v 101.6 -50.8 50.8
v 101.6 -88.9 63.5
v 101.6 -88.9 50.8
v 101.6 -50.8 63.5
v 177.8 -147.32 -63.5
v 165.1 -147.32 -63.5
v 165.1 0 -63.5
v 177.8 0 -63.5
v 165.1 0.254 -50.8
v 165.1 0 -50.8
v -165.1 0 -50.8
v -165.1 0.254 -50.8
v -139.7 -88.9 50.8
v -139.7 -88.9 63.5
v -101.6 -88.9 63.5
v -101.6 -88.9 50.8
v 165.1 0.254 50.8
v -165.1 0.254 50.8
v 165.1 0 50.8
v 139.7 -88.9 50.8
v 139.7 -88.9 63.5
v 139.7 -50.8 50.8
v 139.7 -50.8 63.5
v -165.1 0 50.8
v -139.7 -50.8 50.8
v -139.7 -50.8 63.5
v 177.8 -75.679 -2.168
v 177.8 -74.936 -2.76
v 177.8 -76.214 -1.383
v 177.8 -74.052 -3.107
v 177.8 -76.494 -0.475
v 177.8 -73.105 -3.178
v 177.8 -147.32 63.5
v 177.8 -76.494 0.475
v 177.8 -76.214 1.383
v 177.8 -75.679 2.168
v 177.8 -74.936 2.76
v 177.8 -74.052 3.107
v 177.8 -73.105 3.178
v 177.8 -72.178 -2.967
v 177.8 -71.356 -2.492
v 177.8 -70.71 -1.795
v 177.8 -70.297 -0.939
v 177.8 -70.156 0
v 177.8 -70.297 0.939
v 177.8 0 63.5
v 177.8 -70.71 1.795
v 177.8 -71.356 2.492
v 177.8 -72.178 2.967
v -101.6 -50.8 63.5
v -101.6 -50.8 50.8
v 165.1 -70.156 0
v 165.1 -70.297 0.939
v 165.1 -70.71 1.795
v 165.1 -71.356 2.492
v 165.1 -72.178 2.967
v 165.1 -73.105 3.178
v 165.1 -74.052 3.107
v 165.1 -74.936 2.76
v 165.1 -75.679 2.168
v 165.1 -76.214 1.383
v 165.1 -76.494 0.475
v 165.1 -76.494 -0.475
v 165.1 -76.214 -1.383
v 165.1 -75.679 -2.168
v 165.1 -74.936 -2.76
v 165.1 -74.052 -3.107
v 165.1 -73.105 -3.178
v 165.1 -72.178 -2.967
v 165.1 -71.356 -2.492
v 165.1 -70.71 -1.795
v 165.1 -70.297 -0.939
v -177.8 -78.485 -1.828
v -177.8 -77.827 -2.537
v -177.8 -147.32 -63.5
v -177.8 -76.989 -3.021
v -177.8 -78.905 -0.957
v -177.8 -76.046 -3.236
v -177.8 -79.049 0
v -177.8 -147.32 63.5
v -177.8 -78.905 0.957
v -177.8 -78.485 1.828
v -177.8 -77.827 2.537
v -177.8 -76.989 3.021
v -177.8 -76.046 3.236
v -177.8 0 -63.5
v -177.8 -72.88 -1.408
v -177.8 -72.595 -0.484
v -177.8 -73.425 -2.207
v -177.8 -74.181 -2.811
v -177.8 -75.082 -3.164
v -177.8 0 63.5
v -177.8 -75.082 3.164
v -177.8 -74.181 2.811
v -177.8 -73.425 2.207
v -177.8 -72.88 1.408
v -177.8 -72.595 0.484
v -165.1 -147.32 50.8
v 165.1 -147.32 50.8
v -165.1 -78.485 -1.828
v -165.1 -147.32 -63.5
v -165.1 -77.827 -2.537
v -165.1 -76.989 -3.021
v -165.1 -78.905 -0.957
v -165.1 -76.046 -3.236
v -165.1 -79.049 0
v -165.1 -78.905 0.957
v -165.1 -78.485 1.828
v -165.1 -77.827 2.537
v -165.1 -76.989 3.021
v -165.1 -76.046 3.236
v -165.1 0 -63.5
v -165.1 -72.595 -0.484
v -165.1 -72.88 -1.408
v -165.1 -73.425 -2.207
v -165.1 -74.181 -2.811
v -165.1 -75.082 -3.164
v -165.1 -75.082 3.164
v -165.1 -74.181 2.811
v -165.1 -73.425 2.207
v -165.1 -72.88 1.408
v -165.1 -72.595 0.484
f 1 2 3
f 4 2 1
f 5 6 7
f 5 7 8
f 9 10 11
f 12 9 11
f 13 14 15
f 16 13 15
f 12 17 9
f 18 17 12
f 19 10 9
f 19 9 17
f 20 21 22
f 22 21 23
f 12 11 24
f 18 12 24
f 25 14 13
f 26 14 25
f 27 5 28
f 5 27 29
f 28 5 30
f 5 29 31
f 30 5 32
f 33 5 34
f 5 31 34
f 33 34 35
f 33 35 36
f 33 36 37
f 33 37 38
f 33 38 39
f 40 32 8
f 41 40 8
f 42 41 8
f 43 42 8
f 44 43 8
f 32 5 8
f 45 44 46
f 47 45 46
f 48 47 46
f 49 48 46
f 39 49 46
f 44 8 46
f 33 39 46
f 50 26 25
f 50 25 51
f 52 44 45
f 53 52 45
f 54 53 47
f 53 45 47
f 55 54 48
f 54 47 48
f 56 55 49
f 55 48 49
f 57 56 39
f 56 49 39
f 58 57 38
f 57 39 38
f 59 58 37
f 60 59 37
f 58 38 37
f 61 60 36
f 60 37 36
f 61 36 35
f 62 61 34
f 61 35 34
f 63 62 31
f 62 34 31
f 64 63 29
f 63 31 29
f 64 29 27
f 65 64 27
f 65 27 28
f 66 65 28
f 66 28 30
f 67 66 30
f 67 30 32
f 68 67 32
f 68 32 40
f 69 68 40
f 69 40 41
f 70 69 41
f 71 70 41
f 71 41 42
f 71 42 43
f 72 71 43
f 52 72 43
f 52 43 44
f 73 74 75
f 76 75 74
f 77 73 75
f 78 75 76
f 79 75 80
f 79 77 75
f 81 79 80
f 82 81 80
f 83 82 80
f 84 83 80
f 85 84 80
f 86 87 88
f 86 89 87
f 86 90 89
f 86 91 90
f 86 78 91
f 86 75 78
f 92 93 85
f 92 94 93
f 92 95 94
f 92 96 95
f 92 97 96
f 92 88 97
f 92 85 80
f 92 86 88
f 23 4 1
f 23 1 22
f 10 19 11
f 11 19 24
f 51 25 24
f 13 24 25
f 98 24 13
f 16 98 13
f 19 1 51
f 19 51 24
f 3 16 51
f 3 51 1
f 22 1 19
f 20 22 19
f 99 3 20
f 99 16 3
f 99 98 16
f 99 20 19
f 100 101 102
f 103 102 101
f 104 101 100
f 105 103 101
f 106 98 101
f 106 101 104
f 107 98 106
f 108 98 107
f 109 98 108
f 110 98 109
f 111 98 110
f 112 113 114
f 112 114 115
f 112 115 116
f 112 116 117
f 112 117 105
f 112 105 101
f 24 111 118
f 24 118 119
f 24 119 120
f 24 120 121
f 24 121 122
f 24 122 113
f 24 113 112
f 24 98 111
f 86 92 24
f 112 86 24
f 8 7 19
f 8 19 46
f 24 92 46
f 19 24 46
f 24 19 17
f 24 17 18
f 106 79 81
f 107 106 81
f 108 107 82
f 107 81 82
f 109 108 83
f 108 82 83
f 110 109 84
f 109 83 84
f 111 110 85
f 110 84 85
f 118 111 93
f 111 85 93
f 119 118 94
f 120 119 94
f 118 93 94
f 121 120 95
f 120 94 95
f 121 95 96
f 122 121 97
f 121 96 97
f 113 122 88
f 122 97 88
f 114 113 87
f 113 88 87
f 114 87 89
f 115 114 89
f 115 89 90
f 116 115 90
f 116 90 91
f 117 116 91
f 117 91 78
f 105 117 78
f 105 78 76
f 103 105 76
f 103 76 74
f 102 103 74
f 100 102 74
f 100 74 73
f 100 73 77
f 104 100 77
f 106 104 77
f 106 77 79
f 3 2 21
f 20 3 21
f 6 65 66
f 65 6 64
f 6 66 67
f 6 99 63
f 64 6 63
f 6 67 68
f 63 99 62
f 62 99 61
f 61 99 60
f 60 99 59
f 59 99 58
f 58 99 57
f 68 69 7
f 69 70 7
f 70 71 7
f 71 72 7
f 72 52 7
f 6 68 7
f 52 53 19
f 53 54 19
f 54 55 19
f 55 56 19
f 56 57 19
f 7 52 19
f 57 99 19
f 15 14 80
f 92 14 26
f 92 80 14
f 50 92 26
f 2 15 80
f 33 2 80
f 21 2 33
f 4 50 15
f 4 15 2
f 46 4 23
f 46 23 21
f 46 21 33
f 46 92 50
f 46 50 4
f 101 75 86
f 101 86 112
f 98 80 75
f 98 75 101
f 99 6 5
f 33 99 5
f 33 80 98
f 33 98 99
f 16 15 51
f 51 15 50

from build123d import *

# Parameters (mm, degrees)
F0_W      = 355.6
F0_H      = 127
F1_DEPTH  = 147.32
F2_W      = 330.2
F2_H      = 101.6
F3_DEPTH  = 147.32
F4_W      = 330.2
F4_H      = 101.6
F6_DEPTH  = 0.254
F7_R      = 3.245311
F8_DEPTH  = 25.4
F9_R      = 3.186869
F10_DEPTH = 25.4
F3_FACE_W = 330.2
F3_FACE_H = 147.32
F11_DEPTH = 25.4
F12_W     = 38.1
F12_H     = 38.1
F13_DEPTH = 25.4
F14_DEPTH = 25.4


with BuildPart() as f1:
    # F0 (on Front) → F1 (new body)
    with BuildSketch(Plane.XZ):
        Rectangle(F0_W, F0_H)
    extrude(amount=F1_DEPTH)

    # F2 (on face) → F3 (cut, through all)
    with BuildSketch(Plane.XZ.offset(147.32)):
        Rectangle(F2_W, F2_H)
    extrude(amount=-F3_DEPTH, mode=Mode.SUBTRACT)

    # F7 (on face) → F8 (cut)
    with BuildSketch(Plane(origin=(-177.8, 0, 0), x_dir=(0, -1, 0), z_dir=(-1, 0, 0))):
        with Locations((75.803846, 0)):
            Circle(F7_R)
    extrude(amount=-F8_DEPTH, mode=Mode.SUBTRACT)

    # F9 (on face) → F10 (cut)
    with BuildSketch(Plane.YZ.offset(177.8)):
        with Locations((-73.342763, 0)):
            Circle(F9_R)
    extrude(amount=-F10_DEPTH, mode=Mode.SUBTRACT)

    # F3_face (on face) → F11 (cut)
    with BuildSketch(Plane(origin=(0, -73.66, -50.8), x_dir=(1, 0, 0), z_dir=(0, 0, 1))):
        Rectangle(F3_FACE_W, F3_FACE_H)
    extrude(amount=-F11_DEPTH, mode=Mode.SUBTRACT)

    # F12 (on face) → F13 (cut)
    with BuildSketch(Plane.XY.offset(63.5)):
        with Locations((120.65, -69.85)):
            Rectangle(F12_W, F12_H)
    extrude(amount=-F13_DEPTH, mode=Mode.SUBTRACT)

    # F12 (on face) → F14 (cut)
    with BuildSketch(Plane.XY.offset(63.5)):
        with Locations((-120.65, -69.85)):
            Rectangle(F12_W, F12_H)
    extrude(amount=-F14_DEPTH, mode=Mode.SUBTRACT)


with BuildPart() as f6:
    # F4 (on face) → F6 (new body)
    with BuildSketch(Plane(origin=(0, 0, 0), x_dir=(-1, 0, 0), z_dir=(0, 1, 0))):
        Rectangle(F4_W, F4_H)
    extrude(amount=F6_DEPTH)


solid = Compound([f1.part, f6.part])
